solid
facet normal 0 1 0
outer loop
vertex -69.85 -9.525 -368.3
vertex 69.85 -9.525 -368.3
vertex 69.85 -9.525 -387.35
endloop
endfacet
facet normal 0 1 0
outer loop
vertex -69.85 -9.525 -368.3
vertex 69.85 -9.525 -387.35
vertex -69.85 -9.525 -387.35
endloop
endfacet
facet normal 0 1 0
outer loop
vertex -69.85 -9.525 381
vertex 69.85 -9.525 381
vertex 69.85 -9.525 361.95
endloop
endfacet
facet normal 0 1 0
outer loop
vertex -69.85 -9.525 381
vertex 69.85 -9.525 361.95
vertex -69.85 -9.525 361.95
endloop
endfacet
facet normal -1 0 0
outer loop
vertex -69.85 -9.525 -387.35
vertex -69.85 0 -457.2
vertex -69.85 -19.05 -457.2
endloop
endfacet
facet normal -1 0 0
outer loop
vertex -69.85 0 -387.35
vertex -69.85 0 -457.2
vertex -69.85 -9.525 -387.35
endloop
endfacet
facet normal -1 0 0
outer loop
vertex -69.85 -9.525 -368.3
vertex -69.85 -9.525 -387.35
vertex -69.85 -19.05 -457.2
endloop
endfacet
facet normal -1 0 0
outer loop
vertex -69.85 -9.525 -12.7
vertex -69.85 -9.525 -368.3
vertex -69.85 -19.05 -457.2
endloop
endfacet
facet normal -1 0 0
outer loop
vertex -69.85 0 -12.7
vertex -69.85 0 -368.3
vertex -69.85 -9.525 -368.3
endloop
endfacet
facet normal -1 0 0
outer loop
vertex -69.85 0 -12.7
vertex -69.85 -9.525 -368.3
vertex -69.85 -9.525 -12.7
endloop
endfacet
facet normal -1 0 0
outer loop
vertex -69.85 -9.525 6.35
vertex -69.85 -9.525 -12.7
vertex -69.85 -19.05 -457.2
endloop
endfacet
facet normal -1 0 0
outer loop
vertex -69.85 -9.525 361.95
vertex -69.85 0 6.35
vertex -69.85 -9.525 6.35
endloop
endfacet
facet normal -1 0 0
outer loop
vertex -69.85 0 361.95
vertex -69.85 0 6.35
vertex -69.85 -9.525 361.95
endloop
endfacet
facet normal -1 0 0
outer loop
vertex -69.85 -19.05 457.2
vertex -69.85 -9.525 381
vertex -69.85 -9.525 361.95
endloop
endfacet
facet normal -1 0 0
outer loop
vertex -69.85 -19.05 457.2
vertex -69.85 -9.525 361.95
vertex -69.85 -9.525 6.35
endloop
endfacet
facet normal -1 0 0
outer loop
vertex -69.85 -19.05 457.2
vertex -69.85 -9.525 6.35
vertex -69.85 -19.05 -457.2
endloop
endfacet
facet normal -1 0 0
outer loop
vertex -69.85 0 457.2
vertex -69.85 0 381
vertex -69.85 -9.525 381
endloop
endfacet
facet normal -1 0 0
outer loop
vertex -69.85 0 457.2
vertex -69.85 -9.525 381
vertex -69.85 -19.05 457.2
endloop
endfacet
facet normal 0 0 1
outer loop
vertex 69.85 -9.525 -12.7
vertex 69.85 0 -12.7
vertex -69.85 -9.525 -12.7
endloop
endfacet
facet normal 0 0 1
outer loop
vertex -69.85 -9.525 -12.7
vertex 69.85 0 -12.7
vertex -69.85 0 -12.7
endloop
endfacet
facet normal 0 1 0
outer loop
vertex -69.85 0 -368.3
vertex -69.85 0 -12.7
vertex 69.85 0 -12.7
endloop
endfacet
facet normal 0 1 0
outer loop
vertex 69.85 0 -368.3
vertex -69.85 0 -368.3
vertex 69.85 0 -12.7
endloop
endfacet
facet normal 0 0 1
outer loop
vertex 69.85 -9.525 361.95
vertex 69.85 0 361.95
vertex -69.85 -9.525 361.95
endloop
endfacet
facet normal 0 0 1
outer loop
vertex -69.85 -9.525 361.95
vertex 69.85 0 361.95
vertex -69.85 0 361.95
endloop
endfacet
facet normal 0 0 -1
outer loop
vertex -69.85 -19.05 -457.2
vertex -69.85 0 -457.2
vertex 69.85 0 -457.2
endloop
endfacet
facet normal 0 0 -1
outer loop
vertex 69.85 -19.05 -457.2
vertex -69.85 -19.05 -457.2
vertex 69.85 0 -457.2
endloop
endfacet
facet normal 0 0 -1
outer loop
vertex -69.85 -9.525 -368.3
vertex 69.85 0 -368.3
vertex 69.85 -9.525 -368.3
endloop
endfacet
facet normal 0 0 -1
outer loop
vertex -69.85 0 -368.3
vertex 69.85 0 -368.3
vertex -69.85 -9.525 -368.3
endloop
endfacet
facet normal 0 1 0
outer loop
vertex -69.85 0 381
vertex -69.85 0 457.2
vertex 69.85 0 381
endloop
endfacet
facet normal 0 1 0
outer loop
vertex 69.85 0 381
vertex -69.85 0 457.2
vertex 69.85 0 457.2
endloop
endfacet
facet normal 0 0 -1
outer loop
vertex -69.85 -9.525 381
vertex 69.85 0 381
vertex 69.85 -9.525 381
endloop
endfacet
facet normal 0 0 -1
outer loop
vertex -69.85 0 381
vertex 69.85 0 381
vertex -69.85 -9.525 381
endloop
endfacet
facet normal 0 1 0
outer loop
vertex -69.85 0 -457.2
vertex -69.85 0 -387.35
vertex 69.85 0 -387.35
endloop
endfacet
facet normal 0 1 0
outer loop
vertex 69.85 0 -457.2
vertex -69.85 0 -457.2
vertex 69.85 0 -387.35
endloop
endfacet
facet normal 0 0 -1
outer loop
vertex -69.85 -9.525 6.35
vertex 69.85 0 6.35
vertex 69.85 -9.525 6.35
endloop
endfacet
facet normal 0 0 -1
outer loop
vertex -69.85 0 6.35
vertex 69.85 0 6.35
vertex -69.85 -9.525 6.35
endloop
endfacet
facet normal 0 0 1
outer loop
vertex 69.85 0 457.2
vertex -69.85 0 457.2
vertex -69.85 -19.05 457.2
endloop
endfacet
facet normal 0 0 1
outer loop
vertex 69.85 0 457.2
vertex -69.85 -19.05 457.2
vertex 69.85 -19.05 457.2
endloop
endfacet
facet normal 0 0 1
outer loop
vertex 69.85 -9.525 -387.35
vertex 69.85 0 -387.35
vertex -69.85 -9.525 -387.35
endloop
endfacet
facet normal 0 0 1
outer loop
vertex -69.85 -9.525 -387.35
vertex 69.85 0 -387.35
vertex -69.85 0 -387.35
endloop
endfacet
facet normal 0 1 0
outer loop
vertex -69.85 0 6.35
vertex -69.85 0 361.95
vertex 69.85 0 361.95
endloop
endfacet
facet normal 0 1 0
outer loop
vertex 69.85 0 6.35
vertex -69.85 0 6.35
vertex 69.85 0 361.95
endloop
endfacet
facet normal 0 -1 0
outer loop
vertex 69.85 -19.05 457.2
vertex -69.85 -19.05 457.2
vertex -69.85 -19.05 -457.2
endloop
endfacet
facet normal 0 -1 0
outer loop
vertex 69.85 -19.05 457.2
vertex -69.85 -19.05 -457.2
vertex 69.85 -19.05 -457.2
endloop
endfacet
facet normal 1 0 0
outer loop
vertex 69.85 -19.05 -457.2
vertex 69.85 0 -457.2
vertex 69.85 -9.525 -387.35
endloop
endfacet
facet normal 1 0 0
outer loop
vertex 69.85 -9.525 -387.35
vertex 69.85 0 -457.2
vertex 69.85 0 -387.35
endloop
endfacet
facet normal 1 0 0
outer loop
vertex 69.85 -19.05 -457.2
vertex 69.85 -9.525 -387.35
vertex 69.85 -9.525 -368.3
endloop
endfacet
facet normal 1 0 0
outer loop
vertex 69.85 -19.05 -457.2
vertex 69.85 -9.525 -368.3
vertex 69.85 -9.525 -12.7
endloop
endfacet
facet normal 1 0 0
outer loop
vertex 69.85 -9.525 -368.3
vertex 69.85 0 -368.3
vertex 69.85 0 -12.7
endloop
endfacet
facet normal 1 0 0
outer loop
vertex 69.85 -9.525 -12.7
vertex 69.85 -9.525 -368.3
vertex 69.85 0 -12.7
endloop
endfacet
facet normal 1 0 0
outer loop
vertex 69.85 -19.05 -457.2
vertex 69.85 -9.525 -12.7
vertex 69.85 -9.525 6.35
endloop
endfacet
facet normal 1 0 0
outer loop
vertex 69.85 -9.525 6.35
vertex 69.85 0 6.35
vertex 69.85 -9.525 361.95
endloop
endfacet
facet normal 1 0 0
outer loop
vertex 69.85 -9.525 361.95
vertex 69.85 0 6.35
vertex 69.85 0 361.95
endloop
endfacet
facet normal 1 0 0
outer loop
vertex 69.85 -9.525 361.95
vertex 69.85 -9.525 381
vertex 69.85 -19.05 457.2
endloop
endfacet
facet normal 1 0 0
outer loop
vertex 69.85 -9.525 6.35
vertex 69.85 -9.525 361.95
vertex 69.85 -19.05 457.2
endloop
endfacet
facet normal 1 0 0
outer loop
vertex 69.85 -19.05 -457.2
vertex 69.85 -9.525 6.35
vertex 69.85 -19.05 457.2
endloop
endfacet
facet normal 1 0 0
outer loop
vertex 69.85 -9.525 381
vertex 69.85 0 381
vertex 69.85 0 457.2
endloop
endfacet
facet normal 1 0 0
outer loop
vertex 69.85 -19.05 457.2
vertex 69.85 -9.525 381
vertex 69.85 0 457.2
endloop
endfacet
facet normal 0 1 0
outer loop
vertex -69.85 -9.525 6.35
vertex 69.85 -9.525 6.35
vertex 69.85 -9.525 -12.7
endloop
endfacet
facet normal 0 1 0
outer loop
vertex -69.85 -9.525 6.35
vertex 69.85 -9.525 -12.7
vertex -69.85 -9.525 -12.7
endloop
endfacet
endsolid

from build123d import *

# Parameters (mm, degrees)
F0_W     = 139.7
F0_H     = 914.4
F1_DEPTH = 19.05
F2_W     = 139.7
F2_H     = 19.05
F3_DEPTH = 9.525


# Not quite as in the source:
# - a length typed as a fraction of an inch, garbled in the dataset ("3 / 203.2 mm" for 3/8 in), is restored


with BuildPart() as f1:
    # F0 (on Front) → F1 (new body)
    with BuildSketch(Plane.XZ):
        Rectangle(F0_W, F0_H)
    extrude(amount=F1_DEPTH)

    # F2 (on face) → F3 (cut)
    with BuildSketch(Plane(origin=(0, 0, 0), x_dir=(-1, 0, 0), z_dir=(0, 1, 0))):
        with Locations((0, 371.475)):
            Rectangle(F2_W, F2_H)
        with Locations((0, -3.175)):
            Rectangle(F2_W, F2_H)
        with Locations((0, -377.825)):
            Rectangle(F2_W, F2_H)
    extrude(amount=-F3_DEPTH, mode=Mode.SUBTRACT)


solid = f1.part
